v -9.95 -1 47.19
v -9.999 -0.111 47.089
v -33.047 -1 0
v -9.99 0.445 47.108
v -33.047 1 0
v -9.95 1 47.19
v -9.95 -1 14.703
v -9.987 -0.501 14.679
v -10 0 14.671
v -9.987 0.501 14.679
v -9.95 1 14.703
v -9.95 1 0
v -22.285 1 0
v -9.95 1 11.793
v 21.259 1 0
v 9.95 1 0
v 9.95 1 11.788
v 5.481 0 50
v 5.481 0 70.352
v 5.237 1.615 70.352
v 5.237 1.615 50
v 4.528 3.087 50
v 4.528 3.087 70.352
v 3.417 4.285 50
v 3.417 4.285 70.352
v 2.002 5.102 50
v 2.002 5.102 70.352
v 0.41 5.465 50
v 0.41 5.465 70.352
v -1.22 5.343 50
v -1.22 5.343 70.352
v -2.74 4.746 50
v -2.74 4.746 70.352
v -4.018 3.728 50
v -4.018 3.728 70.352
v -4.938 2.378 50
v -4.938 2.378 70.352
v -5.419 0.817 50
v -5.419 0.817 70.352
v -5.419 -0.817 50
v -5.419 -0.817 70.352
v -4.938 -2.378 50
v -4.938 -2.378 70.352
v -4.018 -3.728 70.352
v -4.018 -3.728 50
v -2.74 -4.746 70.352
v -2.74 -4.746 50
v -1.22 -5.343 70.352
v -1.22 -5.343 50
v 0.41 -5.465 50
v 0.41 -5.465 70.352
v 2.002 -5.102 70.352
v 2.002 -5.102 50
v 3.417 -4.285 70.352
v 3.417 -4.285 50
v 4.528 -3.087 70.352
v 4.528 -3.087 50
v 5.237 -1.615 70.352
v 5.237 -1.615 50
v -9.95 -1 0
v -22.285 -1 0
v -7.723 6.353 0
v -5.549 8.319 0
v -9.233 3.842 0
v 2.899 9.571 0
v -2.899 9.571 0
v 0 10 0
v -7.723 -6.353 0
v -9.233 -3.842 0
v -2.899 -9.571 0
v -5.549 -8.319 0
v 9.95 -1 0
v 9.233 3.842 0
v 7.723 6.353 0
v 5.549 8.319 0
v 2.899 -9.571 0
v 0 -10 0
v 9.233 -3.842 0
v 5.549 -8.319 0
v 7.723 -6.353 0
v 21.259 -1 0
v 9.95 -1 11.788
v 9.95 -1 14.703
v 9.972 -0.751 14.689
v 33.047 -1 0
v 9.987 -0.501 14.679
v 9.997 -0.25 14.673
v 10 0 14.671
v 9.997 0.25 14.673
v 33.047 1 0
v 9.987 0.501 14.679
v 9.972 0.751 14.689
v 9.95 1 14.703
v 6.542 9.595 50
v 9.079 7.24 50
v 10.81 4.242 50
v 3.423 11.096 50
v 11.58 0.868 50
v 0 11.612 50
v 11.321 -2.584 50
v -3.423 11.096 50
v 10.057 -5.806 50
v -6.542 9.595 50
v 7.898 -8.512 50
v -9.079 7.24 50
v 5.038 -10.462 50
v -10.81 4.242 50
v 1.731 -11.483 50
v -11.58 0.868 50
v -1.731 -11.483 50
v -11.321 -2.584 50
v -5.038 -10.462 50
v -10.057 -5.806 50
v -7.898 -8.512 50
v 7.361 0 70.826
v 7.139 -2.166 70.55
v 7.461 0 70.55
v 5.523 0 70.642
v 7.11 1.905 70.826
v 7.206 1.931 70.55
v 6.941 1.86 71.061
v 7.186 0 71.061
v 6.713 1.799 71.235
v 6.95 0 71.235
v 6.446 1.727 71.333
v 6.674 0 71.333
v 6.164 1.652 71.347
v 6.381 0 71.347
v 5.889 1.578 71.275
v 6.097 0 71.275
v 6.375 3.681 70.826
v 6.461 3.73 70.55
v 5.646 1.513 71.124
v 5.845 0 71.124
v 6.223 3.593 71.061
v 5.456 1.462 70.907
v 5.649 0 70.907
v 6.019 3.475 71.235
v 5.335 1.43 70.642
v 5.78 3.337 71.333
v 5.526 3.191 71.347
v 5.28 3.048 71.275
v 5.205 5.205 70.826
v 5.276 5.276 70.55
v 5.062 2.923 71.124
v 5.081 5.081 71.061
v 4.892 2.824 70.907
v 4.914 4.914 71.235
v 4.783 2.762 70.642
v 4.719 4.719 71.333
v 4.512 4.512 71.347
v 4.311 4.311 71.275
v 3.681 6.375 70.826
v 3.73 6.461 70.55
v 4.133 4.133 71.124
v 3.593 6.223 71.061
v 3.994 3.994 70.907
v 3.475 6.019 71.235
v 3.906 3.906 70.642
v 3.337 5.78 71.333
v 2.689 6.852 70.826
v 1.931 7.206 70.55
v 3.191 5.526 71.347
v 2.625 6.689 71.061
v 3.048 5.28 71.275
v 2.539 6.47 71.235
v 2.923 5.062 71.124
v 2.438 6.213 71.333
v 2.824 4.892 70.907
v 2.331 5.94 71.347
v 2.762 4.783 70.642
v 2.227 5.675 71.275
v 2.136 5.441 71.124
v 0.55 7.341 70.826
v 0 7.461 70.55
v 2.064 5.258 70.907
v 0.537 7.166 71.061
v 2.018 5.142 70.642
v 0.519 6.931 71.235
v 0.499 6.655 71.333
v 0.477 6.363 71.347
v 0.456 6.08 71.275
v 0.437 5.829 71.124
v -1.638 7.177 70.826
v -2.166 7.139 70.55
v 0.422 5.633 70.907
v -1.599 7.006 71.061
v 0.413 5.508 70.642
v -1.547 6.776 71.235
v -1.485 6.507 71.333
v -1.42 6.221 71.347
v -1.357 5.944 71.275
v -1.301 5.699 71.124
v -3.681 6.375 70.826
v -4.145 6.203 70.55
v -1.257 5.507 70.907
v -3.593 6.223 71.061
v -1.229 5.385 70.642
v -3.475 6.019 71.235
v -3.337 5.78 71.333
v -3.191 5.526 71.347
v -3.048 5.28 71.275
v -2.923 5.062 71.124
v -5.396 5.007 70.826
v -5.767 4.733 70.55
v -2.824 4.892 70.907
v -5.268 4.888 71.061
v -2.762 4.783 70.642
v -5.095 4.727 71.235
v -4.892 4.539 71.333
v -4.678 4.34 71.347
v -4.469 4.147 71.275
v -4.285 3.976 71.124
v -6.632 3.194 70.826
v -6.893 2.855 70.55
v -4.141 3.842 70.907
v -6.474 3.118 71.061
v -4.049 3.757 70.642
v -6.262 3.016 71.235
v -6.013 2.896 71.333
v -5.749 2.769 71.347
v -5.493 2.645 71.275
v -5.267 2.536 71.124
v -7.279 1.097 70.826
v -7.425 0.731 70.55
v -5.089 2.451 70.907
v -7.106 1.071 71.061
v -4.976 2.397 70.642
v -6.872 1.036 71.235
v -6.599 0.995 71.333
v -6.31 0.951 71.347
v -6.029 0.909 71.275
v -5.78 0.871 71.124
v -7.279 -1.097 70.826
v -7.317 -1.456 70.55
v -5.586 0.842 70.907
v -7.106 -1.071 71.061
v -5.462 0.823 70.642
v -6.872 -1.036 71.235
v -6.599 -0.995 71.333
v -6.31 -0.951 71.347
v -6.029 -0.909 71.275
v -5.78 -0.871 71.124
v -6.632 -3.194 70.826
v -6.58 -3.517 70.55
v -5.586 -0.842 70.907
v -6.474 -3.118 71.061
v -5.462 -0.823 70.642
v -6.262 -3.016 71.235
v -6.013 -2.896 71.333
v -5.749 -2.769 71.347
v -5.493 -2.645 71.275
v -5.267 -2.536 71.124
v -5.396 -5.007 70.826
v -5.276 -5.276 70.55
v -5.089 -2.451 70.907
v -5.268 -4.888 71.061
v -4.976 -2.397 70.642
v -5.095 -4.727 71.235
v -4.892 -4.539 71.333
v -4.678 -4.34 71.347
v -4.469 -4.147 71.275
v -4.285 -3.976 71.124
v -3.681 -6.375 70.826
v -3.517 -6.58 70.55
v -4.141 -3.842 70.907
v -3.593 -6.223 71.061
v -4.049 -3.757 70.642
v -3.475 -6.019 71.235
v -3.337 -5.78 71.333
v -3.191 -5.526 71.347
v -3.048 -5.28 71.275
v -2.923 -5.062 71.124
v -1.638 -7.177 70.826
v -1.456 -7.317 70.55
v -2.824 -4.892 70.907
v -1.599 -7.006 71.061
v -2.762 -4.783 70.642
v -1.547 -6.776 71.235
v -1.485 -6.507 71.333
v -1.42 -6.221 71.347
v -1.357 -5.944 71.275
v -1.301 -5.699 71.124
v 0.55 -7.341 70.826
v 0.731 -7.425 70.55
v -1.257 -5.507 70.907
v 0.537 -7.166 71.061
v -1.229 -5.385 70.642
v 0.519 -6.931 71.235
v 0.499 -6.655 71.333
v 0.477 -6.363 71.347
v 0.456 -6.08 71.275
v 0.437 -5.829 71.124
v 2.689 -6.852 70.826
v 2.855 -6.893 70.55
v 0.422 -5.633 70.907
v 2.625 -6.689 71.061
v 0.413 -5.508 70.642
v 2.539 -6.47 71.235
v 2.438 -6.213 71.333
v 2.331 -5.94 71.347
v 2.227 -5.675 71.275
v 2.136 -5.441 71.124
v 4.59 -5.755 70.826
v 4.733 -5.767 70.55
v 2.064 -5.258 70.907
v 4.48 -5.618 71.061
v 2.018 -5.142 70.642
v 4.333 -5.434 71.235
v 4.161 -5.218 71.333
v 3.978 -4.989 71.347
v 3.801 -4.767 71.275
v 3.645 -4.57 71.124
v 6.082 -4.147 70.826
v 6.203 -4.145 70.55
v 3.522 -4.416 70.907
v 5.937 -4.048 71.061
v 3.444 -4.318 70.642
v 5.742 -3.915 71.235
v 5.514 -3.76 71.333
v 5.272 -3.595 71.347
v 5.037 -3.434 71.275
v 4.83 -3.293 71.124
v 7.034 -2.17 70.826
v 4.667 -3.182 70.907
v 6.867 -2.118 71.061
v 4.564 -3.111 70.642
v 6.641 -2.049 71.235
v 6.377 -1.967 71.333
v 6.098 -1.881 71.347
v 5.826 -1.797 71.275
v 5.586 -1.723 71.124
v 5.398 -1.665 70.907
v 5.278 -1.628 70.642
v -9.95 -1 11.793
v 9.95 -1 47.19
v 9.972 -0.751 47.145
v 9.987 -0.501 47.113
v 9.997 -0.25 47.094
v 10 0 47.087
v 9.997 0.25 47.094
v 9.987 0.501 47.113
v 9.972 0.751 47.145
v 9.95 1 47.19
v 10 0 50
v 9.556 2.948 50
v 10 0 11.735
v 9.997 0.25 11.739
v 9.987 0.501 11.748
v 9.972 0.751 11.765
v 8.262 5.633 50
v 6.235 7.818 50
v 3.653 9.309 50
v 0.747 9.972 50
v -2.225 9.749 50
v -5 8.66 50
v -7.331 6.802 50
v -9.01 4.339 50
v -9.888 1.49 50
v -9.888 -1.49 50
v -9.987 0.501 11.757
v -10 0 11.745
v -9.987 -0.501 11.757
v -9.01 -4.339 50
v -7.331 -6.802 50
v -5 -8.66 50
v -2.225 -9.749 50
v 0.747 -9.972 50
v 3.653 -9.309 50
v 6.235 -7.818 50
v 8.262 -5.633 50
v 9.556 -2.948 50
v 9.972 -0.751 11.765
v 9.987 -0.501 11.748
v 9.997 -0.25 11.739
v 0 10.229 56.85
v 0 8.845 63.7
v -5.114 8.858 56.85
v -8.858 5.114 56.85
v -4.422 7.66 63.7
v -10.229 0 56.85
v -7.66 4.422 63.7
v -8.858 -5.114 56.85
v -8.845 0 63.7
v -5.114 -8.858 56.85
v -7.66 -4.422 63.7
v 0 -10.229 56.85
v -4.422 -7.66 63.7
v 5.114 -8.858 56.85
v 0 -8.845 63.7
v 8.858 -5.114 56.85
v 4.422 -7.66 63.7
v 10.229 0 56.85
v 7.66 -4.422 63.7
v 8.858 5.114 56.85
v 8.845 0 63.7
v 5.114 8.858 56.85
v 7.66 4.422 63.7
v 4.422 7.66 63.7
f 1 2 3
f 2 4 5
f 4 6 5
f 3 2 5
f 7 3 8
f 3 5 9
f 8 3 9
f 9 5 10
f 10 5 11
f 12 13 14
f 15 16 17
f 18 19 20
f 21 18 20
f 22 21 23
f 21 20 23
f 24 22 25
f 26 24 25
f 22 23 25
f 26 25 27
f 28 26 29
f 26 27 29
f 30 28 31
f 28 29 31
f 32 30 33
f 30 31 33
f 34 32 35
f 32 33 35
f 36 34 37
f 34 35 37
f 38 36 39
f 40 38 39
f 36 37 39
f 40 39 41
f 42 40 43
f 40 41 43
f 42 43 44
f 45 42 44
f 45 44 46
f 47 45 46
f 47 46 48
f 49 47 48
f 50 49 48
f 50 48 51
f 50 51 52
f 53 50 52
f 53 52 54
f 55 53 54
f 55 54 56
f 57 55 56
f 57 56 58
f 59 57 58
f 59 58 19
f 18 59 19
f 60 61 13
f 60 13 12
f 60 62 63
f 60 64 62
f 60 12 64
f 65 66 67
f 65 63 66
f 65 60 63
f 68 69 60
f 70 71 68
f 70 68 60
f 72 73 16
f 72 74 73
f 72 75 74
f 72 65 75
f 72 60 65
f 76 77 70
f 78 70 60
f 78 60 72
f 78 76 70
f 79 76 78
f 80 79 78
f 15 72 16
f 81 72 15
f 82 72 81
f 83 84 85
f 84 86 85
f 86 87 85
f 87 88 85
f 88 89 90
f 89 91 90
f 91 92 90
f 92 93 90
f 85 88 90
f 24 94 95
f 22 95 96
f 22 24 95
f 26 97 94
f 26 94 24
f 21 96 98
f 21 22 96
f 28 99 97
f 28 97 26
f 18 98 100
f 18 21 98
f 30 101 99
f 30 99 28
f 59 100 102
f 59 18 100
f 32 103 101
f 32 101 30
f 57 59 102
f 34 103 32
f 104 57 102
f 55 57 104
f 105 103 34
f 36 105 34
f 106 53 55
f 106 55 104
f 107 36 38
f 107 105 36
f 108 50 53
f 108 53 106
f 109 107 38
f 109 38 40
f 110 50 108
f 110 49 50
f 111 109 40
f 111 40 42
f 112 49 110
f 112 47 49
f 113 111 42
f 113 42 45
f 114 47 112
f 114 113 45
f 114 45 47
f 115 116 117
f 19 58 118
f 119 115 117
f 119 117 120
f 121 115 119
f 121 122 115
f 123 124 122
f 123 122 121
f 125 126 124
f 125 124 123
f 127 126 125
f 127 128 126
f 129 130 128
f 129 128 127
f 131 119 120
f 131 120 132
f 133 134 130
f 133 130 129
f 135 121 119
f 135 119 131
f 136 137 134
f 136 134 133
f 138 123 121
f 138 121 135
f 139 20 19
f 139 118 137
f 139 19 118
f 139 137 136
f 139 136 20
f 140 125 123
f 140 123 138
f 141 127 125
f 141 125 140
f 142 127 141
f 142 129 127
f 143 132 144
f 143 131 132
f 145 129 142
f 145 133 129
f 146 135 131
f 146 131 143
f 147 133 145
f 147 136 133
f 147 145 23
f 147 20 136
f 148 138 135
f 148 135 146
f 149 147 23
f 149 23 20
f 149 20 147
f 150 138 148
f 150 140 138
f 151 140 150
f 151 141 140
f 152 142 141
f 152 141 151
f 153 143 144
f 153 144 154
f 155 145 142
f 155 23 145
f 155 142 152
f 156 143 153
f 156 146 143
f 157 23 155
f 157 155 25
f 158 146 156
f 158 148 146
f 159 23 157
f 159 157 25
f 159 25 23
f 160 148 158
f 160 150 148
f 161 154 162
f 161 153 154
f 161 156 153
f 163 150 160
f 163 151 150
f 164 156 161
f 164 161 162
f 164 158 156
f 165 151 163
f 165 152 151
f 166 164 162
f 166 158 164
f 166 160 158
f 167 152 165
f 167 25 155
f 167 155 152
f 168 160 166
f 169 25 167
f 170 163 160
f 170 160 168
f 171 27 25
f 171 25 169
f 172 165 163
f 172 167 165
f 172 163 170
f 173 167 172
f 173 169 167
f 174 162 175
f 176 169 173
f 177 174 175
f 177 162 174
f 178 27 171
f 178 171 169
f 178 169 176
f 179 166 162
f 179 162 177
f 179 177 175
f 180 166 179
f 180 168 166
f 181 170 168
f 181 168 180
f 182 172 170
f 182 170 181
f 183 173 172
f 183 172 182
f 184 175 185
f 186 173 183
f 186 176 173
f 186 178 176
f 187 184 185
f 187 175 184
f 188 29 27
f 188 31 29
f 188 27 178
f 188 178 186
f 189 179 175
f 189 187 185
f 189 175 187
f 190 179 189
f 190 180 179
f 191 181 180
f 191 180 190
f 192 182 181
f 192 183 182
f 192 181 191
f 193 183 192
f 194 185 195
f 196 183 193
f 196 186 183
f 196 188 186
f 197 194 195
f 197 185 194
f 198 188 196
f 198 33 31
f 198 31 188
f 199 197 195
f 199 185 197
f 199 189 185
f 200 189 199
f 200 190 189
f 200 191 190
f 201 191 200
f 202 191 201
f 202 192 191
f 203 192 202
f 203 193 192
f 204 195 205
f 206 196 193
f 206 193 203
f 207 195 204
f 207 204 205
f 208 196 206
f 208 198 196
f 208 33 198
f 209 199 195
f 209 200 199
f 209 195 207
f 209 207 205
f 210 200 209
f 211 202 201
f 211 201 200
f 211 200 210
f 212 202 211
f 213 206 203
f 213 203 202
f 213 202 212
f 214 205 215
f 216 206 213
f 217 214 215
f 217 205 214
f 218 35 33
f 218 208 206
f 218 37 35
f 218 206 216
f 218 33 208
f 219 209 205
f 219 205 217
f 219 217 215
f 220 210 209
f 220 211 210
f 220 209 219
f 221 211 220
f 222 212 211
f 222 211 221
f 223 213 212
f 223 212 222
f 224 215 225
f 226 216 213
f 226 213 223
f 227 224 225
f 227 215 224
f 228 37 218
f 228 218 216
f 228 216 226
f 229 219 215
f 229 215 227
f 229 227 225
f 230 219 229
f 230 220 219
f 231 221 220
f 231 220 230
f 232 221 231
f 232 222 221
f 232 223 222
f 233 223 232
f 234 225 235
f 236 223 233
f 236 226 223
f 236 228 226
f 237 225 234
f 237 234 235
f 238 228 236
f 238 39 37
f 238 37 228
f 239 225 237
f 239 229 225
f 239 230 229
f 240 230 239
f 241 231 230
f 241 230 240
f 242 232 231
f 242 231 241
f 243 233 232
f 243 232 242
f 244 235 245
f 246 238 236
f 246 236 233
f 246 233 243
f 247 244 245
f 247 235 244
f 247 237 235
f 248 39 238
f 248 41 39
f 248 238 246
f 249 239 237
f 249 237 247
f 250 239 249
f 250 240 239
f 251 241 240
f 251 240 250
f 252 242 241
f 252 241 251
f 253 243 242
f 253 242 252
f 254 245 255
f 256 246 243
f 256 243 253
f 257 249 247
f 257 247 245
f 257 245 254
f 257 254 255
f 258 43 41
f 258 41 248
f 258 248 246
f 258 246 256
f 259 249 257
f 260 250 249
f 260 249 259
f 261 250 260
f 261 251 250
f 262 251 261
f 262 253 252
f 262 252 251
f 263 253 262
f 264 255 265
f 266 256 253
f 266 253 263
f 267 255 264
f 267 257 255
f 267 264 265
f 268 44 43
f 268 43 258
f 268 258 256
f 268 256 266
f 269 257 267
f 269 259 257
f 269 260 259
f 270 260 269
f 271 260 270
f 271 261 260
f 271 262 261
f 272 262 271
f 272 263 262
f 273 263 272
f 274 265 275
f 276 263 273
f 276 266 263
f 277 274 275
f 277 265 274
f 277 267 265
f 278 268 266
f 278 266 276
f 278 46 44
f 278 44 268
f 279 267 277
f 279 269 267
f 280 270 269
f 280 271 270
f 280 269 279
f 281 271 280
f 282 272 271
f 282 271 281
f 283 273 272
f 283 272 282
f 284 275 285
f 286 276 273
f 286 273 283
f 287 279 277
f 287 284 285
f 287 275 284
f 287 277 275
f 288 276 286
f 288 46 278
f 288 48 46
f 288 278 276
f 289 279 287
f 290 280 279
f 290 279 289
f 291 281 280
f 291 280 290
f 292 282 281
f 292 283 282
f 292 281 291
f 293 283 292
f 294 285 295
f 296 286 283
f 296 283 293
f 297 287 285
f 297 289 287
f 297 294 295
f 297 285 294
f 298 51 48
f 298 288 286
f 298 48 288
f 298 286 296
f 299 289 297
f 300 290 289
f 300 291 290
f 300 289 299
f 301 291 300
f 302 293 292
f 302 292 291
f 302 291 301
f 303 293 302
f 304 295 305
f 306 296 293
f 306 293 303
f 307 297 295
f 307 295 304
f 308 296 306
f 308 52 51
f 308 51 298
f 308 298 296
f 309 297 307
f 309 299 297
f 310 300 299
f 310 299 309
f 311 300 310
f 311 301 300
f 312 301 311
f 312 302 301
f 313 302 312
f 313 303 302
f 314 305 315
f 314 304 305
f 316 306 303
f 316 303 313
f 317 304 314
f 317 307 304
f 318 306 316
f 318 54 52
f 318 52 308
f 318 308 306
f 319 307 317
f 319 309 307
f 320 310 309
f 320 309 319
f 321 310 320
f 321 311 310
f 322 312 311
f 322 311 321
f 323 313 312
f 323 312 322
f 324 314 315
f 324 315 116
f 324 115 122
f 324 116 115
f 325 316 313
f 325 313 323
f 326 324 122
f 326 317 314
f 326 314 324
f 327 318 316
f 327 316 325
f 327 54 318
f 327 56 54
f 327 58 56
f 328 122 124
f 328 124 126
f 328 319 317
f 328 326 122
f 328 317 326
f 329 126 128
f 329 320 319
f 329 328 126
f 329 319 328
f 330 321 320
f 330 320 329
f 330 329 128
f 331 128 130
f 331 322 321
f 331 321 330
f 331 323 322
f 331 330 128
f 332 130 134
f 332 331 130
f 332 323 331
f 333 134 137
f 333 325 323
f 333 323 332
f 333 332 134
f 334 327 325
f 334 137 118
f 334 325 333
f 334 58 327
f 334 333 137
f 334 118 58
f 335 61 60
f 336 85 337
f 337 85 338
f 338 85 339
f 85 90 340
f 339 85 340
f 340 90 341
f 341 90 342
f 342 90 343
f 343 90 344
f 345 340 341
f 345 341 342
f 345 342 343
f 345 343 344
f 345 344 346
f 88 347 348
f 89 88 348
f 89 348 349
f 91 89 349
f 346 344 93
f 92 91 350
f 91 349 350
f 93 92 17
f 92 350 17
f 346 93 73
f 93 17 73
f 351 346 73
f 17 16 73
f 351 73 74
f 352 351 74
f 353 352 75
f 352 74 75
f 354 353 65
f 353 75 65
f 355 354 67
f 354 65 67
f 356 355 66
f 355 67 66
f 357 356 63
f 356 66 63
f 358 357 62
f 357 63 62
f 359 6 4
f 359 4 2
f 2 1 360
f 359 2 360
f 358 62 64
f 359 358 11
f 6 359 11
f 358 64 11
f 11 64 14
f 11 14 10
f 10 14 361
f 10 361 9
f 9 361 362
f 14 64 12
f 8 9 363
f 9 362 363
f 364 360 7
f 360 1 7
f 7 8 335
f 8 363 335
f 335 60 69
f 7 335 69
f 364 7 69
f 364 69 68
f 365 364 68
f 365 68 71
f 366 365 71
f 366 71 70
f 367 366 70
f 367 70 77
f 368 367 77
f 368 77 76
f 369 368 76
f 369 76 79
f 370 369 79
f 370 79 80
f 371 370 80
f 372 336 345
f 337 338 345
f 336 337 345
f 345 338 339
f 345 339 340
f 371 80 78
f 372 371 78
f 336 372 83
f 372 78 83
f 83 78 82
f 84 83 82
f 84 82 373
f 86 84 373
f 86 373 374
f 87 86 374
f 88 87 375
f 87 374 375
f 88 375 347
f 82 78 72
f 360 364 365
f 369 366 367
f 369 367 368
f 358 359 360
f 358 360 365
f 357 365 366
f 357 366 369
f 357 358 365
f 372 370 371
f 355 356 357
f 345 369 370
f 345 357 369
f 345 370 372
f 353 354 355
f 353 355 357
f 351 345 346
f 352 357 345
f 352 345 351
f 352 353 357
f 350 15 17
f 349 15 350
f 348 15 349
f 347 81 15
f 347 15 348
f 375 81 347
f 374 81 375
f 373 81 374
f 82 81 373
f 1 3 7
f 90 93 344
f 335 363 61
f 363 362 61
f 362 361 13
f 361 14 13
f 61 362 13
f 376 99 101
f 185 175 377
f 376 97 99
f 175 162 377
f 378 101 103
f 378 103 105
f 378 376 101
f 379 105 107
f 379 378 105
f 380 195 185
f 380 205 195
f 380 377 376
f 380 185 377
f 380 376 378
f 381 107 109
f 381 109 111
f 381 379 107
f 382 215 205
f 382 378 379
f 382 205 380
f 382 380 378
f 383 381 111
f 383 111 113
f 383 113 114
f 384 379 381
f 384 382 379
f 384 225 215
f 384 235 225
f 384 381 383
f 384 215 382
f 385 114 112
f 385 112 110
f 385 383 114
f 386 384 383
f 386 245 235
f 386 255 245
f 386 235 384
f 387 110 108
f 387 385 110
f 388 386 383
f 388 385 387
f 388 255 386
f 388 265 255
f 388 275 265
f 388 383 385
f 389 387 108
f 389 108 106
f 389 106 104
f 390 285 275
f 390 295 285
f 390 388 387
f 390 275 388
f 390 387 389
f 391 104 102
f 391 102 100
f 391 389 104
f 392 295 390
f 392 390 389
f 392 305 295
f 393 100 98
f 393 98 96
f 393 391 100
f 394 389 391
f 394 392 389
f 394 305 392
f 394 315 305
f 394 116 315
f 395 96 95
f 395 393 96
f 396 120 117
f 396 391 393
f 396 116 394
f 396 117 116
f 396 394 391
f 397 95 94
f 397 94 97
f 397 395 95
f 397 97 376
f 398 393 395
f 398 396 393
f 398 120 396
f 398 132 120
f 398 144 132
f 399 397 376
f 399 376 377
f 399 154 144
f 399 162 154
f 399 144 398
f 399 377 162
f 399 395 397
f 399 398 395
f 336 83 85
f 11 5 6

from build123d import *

# Parameters (mm, degrees)
F0_R        = 10
F1_DEPTH    = 50
F5_DEPTH    = 1
F7_R        = 5.4805132886
F8_DEPTH    = 107.4792907963
F9_T3_ANGLE = 270
F9_T6_ANGLE = 90


# Not quite as in the source:
# - a fillet or chamfer that OpenCascade refuses, or shapes differently, is made with other operations: its cross-section is extruded or revolved along the edge and cut away or added


with BuildPart() as f1:
    # F0 (on Top) → F1 (new body)
    with BuildSketch(Plane.XY):
        Circle(F0_R)
    extrude(amount=F1_DEPTH)

    # F4 (on Front) → F5 (join, symmetric)
    with BuildSketch(Plane.XZ):
        Polygon((-9.3656852841, 15.0750800967), (-9.0752122924, 48.9769205451), (-33.046875149, 0), align=None)
        Polygon((33.046875149, 0), (9.0752122924, 48.9769205451), (9.3656852841, 15.0750800967), align=None)
        Polygon((-9.8870191723, 11.8531188655), (-22.2848262638, 0), (-9.8870191723, 0), align=None)
        Polygon((21.2586894631, 0), (9.8870191723, 11.8531188655), (9.8870191723, 0), align=None)
    extrude(amount=F5_DEPTH, both=True)


with BuildPart() as f3:
    # F2 (on Right) → F3 (revolve)
    with BuildSketch(Plane.YZ):
        Polygon((0, 50), (11.6124056444, 50), (0, 107.4782907963), align=None)
    revolve(axis=Axis((0, 0, 78.7391453981), (0, 0, 1)))

    # F7 (on face) → F8 (cut, through all)
    with BuildSketch(Plane.XY.offset(107.4782907963)):
        Circle(F7_R)
    extrude(amount=-F8_DEPTH, mode=Mode.SUBTRACT)

    # F9: fillet of radius 1 on 2 edges, made by hand


with BuildPart() as f9_tool1:
    # F9_s2 → F9_t3 (revolve)
    with BuildSketch(Plane.YZ):
        with BuildLine():
            ThreePointArc((7.4607092239, 70.5497828324), (6.3810043326, 71.3467893791), (5.4805132886, 70.3517527126))
            Line((5.4805132886, 70.3517527126), (5.4805132886, 80.3512211639))
            Line((5.4805132886, 80.3512211639), (7.4607092239, 70.5497828324))
        make_face()
    revolve(axis=Axis((0, 0, 80.3512211639), (0, 0, 1)), revolution_arc=F9_T3_ANGLE)


with BuildPart() as f9_tool4:
    # F9_s5 → F9_t6 (revolve)
    with BuildSketch(Plane.XZ):
        with BuildLine():
            ThreePointArc((7.4607092239, 70.5497828324), (6.3810043326, 71.3467893791), (5.4805132886, 70.3517527126))
            Line((5.4805132886, 70.3517527126), (5.4805132886, 80.3512211639))
            Line((5.4805132886, 80.3512211639), (7.4607092239, 70.5497828324))
        make_face()
    revolve(axis=Axis((0, 0, 80.3512211639), (0, 0, 1)), revolution_arc=F9_T6_ANGLE)


with BuildPart() as f3_1:
    add(f3.part)

    # F9_t7: cut F9_tool1, F9_tool4
    add([f9_tool1.part, f9_tool4.part], mode=Mode.SUBTRACT)


solid = Compound([f1.part, f3_1.part])
